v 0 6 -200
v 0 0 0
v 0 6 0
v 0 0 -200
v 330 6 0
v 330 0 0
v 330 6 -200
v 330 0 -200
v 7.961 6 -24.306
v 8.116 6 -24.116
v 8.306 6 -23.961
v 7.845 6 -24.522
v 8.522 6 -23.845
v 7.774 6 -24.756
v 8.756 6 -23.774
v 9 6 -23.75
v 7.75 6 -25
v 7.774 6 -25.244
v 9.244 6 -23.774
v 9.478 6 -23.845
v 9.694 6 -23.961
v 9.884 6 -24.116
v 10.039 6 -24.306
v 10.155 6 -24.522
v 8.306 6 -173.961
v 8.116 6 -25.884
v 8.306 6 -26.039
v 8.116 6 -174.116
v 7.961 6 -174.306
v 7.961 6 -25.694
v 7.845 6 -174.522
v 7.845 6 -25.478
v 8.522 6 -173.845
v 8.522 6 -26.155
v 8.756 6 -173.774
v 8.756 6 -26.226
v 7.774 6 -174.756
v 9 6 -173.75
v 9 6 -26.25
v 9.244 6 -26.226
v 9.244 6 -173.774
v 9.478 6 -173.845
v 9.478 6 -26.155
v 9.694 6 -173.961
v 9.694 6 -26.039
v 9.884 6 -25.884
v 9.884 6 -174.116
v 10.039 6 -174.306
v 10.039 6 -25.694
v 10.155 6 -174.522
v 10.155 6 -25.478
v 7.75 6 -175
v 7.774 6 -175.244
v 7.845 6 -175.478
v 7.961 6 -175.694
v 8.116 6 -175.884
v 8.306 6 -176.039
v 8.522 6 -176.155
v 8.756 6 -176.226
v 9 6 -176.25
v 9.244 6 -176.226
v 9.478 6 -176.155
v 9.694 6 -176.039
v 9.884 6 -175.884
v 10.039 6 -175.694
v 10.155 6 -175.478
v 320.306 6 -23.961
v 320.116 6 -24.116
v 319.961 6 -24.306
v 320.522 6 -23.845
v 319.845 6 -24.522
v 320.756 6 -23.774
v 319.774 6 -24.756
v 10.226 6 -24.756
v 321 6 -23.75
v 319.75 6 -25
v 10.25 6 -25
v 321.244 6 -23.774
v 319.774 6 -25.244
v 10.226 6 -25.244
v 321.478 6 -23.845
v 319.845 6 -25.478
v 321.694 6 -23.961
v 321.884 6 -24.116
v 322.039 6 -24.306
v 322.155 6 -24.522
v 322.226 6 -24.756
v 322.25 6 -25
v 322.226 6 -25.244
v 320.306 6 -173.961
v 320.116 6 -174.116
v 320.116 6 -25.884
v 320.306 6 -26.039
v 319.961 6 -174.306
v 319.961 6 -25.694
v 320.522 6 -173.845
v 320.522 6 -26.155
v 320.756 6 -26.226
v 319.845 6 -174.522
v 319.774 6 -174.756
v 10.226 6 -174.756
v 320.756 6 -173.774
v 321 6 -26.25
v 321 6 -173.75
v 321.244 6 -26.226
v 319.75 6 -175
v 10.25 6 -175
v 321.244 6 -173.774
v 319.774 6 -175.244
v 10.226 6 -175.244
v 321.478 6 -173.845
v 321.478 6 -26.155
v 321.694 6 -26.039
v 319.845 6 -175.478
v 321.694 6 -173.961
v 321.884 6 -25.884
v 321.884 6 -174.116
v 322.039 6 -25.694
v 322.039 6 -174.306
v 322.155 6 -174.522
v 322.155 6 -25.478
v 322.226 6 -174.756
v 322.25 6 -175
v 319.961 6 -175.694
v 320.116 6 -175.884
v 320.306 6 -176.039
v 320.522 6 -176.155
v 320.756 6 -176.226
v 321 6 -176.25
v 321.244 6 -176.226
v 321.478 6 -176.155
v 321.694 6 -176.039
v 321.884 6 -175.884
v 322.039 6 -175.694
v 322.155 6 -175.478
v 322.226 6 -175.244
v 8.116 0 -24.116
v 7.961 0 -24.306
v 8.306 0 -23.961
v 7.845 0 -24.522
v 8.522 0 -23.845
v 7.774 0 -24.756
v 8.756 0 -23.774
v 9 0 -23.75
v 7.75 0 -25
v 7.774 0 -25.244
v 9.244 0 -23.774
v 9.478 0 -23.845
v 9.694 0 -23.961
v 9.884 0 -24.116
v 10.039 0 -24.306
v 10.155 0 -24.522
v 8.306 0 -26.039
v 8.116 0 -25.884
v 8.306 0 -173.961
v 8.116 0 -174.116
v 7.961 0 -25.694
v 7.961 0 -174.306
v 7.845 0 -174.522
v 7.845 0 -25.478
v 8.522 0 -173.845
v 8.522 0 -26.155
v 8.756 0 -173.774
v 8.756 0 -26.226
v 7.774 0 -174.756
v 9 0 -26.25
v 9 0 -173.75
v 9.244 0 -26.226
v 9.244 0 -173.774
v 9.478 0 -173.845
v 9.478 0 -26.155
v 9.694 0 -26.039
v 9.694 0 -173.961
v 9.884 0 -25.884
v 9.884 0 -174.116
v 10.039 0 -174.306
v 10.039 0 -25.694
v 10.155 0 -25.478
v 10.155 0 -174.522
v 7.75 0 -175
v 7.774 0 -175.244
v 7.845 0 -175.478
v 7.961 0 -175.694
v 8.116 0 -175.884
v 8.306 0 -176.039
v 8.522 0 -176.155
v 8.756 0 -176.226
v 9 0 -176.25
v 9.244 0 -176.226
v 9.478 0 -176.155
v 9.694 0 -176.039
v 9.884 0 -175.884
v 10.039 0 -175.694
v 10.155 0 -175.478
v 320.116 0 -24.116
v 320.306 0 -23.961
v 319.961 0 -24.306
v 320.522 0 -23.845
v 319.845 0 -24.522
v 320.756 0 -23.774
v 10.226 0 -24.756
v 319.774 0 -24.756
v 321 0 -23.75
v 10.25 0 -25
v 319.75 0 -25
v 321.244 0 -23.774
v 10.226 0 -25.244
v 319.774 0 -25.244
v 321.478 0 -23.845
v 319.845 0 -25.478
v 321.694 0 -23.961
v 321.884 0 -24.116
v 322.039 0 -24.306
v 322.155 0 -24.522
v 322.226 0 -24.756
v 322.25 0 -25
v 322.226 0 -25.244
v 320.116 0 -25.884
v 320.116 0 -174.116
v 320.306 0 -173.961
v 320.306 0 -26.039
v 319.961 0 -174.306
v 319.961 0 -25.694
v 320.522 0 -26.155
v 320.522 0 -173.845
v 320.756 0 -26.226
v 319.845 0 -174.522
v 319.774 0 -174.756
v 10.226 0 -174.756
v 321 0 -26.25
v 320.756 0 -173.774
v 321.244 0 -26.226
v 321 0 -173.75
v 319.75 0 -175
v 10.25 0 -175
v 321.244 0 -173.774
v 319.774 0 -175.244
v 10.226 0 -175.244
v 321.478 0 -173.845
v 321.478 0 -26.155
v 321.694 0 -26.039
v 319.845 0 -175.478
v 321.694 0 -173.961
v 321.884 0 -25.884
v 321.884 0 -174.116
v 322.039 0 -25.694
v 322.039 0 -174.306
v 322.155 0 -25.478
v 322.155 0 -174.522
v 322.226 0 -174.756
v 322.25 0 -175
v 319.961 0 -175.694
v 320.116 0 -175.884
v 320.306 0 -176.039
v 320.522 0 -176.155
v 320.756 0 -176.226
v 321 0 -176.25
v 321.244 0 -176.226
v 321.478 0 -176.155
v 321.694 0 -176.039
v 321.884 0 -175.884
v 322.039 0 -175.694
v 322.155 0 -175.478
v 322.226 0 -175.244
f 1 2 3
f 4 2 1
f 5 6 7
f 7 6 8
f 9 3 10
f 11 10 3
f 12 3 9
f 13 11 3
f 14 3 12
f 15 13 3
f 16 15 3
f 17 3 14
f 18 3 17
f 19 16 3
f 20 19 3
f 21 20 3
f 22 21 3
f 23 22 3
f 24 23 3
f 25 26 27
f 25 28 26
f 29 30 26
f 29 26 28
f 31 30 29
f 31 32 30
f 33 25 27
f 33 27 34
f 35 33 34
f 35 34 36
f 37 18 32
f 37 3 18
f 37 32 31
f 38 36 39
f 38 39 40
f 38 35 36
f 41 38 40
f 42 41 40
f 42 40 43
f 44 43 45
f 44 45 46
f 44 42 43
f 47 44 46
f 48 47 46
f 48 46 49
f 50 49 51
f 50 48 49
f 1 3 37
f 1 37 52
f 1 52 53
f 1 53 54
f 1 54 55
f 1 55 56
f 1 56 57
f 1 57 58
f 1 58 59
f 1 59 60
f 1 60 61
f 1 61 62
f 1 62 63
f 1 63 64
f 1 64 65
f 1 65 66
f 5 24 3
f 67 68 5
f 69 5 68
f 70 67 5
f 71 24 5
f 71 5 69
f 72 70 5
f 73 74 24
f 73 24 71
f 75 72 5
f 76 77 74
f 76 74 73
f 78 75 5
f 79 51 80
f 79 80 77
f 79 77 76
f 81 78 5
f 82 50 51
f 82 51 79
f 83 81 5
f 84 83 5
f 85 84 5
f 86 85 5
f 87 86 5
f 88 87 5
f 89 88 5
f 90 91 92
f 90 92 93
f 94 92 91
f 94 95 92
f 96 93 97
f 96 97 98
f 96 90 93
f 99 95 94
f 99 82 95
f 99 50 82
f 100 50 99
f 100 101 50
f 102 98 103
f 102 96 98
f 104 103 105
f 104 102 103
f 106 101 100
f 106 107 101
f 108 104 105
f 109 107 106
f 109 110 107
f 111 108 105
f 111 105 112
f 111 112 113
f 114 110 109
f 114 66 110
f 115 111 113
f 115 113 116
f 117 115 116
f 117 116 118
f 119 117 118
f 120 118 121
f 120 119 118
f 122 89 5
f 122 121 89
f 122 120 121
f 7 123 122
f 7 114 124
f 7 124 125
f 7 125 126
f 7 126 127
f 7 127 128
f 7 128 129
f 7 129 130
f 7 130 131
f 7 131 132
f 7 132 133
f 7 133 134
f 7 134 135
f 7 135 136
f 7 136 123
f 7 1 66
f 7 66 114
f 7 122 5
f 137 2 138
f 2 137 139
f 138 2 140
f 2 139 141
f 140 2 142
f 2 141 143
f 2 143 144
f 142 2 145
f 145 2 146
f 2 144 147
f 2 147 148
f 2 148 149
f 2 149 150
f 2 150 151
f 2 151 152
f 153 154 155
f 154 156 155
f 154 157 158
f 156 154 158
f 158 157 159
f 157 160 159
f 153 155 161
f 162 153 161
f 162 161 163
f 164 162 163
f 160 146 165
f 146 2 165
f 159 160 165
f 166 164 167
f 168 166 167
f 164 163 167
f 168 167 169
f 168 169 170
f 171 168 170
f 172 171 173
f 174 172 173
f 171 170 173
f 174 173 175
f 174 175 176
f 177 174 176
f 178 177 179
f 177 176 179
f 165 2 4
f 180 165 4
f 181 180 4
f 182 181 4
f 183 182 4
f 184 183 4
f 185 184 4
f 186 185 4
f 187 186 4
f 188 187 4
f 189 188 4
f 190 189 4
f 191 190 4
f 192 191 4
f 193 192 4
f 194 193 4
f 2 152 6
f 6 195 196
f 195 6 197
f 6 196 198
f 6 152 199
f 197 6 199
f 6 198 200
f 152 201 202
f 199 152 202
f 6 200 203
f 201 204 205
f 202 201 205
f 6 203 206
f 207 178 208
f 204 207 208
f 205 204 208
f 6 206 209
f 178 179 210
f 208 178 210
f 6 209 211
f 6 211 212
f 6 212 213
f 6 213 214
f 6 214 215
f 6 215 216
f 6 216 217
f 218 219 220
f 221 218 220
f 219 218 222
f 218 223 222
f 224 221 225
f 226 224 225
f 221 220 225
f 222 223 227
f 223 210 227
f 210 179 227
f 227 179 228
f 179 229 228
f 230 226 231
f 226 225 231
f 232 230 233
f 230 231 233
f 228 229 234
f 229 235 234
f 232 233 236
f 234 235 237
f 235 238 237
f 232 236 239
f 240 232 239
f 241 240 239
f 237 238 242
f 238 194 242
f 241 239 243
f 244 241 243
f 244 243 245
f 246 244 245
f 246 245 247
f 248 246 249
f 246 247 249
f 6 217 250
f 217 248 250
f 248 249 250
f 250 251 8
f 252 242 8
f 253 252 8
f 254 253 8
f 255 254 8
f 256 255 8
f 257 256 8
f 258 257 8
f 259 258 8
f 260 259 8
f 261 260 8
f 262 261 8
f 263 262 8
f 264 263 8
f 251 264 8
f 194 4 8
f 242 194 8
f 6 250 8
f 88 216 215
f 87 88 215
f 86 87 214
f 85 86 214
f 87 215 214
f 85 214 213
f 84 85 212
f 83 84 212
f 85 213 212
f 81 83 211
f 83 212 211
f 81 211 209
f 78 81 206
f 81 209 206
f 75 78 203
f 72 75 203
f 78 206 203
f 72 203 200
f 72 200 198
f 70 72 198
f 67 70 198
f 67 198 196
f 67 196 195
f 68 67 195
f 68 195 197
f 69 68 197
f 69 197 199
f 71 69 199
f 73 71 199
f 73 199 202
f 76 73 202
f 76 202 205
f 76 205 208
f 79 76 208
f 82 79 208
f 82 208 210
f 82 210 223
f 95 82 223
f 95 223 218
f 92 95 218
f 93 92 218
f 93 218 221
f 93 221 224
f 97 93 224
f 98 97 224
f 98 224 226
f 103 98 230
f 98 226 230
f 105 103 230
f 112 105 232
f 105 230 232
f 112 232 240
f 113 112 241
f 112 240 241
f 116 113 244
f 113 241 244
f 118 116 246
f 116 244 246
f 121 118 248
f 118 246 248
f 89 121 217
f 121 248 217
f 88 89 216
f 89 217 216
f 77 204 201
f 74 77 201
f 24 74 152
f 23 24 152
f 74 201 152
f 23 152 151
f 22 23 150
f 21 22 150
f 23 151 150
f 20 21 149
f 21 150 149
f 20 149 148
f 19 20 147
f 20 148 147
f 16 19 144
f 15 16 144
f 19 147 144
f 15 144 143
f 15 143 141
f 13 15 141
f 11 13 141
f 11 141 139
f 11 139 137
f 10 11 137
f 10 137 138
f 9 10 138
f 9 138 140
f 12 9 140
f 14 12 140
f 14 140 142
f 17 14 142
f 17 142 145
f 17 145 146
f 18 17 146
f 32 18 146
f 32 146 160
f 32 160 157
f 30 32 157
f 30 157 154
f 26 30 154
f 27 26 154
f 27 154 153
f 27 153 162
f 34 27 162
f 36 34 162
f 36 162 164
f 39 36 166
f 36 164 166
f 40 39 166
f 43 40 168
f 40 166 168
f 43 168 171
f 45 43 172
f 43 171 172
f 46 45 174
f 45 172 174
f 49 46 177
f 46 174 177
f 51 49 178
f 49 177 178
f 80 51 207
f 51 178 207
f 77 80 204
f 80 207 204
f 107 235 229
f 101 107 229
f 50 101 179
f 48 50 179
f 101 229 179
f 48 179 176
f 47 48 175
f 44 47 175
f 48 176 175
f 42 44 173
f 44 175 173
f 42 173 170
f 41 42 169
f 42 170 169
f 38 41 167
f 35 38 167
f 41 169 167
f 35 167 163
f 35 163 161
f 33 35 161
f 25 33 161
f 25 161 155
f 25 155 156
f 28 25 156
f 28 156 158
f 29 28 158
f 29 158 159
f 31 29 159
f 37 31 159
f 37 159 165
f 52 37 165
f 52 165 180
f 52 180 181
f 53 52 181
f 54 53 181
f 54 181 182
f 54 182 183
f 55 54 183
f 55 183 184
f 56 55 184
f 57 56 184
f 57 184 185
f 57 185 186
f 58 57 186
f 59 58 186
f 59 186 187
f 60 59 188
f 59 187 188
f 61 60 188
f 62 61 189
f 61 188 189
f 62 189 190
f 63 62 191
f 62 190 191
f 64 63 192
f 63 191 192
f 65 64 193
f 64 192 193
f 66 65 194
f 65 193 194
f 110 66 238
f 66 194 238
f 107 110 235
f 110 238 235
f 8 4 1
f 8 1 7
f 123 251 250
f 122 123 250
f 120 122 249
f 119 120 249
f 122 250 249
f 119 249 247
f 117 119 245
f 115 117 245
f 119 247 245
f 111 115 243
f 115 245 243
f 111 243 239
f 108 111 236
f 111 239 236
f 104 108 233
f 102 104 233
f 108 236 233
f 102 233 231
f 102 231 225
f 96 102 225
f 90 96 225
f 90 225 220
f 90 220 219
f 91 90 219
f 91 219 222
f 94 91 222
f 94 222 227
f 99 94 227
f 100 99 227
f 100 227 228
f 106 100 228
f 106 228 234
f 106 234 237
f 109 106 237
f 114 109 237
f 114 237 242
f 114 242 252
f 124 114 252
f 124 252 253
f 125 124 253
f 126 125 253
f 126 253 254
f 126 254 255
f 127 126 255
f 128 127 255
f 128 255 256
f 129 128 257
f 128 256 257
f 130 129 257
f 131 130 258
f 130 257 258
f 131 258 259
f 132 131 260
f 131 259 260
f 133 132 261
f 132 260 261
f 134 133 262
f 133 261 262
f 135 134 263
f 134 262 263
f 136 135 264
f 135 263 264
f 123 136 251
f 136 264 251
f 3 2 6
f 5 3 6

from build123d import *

# Parameters (mm, degrees)
SKETCH1_W           = 330
SKETCH1_H           = 200
BOSS_EXTRUDE1_DEPTH = 6
SKETCH4_R           = 1.25
CUT_EXTRUDE1_DEPTH  = 7


with BuildPart() as part:
    # Sketch1 → Boss-Extrude1 (new body)
    with BuildSketch(Plane(origin=(0, 0, 0), x_dir=(1, 0, 0), z_dir=(0, 1, 0))):
        with Locations((165, 100)):
            Rectangle(SKETCH1_W, SKETCH1_H)
    extrude(amount=BOSS_EXTRUDE1_DEPTH)

    # Sketch4 → Cut-Extrude1 (cut, through all)
    with BuildSketch(Plane.XZ):
        with Locations((9, -175)):
            Circle(SKETCH4_R)
        with Locations((9, -25)):
            Circle(SKETCH4_R)
        with Locations((321, -175)):
            Circle(SKETCH4_R)
        with Locations((321, -25)):
            Circle(SKETCH4_R)
    extrude(amount=-CUT_EXTRUDE1_DEPTH, mode=Mode.SUBTRACT)


solid = part.part
